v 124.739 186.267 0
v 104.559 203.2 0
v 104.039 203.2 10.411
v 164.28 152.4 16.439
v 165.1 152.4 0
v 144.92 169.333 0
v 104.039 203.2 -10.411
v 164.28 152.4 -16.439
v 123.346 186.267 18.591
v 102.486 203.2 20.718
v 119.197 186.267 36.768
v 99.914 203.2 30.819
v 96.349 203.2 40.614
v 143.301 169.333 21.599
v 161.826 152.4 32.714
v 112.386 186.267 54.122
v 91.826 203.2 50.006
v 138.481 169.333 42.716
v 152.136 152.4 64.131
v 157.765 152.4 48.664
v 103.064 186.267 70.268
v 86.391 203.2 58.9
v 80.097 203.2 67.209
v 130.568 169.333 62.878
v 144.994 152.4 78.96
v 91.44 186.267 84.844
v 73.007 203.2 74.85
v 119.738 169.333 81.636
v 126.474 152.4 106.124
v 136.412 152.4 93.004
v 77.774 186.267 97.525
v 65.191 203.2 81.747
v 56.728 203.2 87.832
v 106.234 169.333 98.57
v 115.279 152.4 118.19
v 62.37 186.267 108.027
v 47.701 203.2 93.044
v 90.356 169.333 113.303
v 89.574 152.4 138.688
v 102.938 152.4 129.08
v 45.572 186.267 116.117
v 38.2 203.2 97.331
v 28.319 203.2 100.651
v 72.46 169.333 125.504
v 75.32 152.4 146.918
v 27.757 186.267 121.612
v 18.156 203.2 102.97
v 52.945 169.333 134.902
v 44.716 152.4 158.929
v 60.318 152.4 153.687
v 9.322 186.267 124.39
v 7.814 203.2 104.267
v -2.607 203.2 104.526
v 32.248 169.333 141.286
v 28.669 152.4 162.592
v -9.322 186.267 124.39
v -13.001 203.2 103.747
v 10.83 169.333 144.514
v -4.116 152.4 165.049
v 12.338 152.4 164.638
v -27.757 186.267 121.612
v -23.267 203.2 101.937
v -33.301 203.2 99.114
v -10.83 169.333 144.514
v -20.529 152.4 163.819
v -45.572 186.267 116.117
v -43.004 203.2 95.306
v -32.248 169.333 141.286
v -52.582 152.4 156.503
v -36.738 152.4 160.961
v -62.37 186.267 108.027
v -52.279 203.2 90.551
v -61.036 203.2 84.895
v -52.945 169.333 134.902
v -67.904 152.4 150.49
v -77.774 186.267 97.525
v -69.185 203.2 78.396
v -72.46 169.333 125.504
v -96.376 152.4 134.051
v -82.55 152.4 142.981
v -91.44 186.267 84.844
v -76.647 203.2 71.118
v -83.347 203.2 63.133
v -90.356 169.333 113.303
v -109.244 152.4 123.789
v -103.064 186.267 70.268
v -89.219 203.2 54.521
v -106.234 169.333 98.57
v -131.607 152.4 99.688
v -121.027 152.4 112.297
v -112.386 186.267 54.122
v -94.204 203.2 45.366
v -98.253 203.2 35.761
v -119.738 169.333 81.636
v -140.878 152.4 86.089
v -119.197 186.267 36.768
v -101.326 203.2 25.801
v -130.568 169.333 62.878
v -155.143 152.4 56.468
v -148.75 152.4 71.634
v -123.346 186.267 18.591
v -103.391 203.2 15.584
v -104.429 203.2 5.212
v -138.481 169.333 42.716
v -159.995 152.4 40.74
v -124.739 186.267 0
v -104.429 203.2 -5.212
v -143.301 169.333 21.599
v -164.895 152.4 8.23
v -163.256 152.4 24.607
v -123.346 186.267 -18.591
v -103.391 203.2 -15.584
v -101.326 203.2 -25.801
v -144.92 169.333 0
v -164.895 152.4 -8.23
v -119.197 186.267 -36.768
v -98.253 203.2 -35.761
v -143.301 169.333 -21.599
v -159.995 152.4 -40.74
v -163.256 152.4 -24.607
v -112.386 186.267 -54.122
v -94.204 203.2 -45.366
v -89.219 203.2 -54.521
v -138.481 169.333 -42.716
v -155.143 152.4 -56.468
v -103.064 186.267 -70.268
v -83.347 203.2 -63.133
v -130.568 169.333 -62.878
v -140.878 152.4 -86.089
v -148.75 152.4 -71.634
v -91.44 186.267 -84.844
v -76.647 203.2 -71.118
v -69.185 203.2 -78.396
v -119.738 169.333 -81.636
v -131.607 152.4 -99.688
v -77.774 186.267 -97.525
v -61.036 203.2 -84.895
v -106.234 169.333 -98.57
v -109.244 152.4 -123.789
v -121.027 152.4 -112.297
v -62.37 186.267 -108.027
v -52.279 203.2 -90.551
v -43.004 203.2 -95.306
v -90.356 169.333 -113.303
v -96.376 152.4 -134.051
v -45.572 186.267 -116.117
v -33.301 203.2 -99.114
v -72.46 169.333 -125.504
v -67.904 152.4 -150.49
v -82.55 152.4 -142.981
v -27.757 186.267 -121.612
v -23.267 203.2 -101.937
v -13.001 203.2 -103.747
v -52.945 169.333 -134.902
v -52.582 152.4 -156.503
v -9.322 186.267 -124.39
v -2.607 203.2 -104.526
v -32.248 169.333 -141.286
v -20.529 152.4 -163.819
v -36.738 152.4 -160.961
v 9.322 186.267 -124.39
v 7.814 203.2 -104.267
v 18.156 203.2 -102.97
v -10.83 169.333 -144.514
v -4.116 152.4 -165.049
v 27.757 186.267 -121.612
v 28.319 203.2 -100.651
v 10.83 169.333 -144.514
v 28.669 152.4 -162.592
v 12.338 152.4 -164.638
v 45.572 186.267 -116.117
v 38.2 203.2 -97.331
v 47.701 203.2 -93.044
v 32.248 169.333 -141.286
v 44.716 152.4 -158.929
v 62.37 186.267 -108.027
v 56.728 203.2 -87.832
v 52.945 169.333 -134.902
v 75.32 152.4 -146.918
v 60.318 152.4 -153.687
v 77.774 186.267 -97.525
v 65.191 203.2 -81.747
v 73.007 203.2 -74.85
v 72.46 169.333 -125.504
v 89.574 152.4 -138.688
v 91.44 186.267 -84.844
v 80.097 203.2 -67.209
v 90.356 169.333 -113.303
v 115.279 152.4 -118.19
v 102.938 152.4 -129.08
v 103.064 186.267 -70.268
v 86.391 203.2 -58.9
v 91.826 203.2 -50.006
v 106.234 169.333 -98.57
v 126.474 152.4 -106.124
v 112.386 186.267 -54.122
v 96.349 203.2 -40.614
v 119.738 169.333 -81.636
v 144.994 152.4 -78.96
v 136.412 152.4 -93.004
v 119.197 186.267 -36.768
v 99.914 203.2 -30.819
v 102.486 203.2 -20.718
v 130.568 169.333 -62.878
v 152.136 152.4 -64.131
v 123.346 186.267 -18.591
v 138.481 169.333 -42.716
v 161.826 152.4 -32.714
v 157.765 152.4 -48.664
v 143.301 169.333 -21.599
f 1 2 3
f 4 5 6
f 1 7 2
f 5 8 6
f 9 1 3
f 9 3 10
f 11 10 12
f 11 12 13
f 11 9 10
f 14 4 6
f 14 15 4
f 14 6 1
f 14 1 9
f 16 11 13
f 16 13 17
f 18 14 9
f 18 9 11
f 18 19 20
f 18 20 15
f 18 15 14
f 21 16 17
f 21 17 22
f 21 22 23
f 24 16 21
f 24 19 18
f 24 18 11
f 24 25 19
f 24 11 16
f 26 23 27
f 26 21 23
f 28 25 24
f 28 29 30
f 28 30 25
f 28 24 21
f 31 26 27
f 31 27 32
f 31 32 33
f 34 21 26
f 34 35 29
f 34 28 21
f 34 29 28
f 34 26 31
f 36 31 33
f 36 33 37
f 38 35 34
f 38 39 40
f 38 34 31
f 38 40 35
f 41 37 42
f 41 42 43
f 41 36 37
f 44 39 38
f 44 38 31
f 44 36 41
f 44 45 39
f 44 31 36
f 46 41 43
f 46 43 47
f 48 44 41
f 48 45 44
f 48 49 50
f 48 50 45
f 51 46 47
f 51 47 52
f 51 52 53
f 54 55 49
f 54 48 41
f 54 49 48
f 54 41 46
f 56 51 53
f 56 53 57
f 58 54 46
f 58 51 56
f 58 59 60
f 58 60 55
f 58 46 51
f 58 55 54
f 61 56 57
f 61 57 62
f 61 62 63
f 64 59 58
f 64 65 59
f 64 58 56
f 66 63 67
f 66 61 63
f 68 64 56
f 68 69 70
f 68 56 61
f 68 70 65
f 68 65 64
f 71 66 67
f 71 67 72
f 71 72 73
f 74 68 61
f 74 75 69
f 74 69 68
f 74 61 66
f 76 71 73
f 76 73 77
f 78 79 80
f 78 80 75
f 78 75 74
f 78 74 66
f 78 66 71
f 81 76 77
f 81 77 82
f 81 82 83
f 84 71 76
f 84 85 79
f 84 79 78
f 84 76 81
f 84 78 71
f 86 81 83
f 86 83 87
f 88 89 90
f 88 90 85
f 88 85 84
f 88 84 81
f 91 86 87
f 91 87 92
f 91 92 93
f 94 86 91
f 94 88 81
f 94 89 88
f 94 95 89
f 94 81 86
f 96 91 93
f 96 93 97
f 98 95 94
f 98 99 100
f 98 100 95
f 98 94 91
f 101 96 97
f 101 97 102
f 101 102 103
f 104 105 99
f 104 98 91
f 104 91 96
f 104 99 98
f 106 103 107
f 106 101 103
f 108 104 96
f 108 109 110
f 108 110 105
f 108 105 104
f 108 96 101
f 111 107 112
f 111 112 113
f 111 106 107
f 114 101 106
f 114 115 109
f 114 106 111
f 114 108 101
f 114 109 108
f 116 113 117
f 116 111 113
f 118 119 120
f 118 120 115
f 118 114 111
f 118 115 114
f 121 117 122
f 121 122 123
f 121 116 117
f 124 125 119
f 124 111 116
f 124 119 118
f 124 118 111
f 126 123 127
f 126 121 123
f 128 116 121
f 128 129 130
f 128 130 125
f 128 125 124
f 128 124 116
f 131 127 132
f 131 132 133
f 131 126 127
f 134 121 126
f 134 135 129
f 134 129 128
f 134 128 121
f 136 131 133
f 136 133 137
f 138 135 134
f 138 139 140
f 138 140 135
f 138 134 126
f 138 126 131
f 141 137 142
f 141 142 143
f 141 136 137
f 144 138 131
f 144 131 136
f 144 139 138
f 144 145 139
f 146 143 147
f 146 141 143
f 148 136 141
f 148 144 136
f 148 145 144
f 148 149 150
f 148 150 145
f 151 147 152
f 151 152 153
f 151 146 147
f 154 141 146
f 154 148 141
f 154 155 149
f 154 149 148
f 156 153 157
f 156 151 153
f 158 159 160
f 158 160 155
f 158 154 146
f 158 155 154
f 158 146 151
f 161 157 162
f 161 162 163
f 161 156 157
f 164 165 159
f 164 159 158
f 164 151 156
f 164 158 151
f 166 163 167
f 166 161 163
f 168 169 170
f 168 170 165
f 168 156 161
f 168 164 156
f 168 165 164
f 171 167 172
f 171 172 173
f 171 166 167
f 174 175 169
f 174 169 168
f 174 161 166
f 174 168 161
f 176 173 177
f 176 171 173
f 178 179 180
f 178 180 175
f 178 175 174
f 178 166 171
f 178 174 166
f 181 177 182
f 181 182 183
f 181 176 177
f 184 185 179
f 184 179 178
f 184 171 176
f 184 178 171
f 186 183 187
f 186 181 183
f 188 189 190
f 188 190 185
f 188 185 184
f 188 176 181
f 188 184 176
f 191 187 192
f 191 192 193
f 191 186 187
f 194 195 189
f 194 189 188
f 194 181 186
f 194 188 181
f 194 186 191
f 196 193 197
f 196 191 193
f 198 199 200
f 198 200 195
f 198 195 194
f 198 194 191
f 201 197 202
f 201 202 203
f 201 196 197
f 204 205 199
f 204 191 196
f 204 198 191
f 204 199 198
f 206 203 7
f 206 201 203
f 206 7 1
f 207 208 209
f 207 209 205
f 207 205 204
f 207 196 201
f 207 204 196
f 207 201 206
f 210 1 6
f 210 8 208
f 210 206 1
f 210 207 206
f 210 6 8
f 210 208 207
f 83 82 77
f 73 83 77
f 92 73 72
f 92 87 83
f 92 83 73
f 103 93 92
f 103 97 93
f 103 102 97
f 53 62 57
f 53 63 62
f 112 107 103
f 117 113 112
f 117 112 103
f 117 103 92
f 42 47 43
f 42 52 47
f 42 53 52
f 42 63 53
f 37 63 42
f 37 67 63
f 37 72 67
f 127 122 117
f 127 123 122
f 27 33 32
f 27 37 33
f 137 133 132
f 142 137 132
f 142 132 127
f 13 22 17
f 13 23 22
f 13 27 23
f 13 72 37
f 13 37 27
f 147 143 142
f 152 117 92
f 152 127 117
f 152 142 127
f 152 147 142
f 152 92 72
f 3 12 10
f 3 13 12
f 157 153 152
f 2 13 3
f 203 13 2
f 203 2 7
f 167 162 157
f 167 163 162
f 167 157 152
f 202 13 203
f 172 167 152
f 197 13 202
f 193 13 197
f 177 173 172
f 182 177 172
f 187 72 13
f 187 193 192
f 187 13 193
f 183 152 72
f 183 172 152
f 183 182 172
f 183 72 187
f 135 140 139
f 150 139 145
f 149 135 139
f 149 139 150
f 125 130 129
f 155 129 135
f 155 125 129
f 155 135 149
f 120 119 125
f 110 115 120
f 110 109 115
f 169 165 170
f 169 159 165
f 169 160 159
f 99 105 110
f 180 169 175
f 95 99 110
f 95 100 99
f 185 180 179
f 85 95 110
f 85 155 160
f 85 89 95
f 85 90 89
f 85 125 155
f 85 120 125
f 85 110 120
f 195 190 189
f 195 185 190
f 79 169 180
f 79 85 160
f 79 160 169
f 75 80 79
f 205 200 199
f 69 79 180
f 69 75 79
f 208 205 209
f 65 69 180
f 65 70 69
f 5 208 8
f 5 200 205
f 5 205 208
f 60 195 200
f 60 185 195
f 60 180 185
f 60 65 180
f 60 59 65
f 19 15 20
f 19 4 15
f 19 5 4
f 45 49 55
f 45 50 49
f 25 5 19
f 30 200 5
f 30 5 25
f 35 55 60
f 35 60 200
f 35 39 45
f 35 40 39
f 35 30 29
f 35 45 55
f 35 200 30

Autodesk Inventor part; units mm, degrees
sketch "Sketch1" plane through (0, 0, 0) normal (0, 1, 0) x (-1, 0, 0)
  circle A0 centre (0, 0) radius 152.4
  circle A1 centre (0, 0) radius 165.1
  dimension "d0" = 304.8
  dimension "d1" = 330.2
extrude "Extrusion1" add sketch "Sketch1" along normal blind 152.4
sketch "Sketch2" plane through (0, 0, 0) normal (1, 0, 0) x (0, 1, 0)
  circle A0 centre (100.6077, 0) radius 25.4
  point P0 (0, 0)
  dimension "d4" = 50.8
extrude "Extrusion2" add sketch "Sketch2" along normal mid plane 889
sketch "Sketch4" plane through (0, 152.4, 0) normal (0, 1, 0) x (1, 0, 0)
  circle A0 centre (0, 0) radius 152.4
extrude "Extrusion4" cut sketch "Sketch4" against normal through all
sketch "Sketch5" plane through (0, 152.4, 0) normal (0, 1, 0) x (1, 0, 0)
  circle A0 centre (0, 0) radius 165.1
extrude "Extrusion5" add sketch "Sketch5" along normal blind 50.8 draft -50
ref_plane "Work Plane2" through (75.376, -18.8821, -44.9646) normal (1, 0, 0) x (0, 1, 0)
ref_plane "Work Plane5" through (0, 25.4, 165.1) normal (0, 0, 1) x (1, 0, 0)
sketch "Sketch11" plane through (0, 25.4, 165.1) normal (0, 0, 1) x (1, 0, 0)
  circle A0 centre (0, 75.2094) radius 25.4
  line L0 (165.1, -25.4) -> (-165.1, -25.4) projected
  point P0 (0, -25.4)
  dimension "d31" = 50.8
  dimension "d32" = 100.6094
extrude "Extrusion11" add sketch "Sketch11" along normal blind 280.543
ref_plane "Work Plane6" through (0, 25.4, -165.1) normal (0, 0, 1) x (1, 0, 0)
sketch "Sketch12" plane through (0, 25.4, -165.1) normal (0, 0, 1) x (1, 0, 0)
  circle A0 centre (0, 75.2094) radius 25.4
  line L0 (165.1, -25.4) -> (-165.1, -25.4) projected
  point P0 (0, -25.4)
  dimension "d36" = 50.8
  dimension "d37" = 100.6094
extrude "Extrusion12" add sketch "Sketch12" against normal blind 280.543
ref_plane "Work Plane10" through (0, 152.4, 0) normal (0, -1, 0) x (1, 0, 0)
ref_plane "Work Plane9" through (0, 63.5, 0) normal (0, -1, 0) x (1, 0, 0)
sketch "Sketch14" plane through (0, 63.5, 0) normal (0, -1, 0) x (1, 0, 0)
  line L0 (-189.7063, -193.5388) -> (215.5754, -193.5388)
  line L1 (215.5754, -193.5388) -> (215.5754, 199.2875)
  line L2 (215.5754, 199.2875) -> (-189.7063, 199.2875)
  line L3 (-189.7063, 199.2875) -> (-189.7063, -193.5388)
  point P0 (0, 0)
extrude "Extrusion14" cut sketch "Sketch14" along normal blind 127
sketch "Sketch15" plane through (0, 152.4, 0) normal (0, -1, 0) x (1, 0, 0)
  line L0 (-561.0288, -551.6284) -> (540.3691, -551.6284)
  line L1 (540.3691, -551.6284) -> (540.3691, 531.8606)
  line L2 (540.3691, 531.8606) -> (-561.0288, 531.8606)
  line L3 (-561.0288, 531.8606) -> (-561.0288, -551.6284)
  point P0 (0, 0)
extrude "Extrusion15" cut sketch "Sketch15" along normal blind 254
ref_plane "Work Plane8" through (0, 0, 0) normal (0, -1, 0) x (1, 0, 0)
properties part number "UpperSailCapTop-ver1-1111-2021"
